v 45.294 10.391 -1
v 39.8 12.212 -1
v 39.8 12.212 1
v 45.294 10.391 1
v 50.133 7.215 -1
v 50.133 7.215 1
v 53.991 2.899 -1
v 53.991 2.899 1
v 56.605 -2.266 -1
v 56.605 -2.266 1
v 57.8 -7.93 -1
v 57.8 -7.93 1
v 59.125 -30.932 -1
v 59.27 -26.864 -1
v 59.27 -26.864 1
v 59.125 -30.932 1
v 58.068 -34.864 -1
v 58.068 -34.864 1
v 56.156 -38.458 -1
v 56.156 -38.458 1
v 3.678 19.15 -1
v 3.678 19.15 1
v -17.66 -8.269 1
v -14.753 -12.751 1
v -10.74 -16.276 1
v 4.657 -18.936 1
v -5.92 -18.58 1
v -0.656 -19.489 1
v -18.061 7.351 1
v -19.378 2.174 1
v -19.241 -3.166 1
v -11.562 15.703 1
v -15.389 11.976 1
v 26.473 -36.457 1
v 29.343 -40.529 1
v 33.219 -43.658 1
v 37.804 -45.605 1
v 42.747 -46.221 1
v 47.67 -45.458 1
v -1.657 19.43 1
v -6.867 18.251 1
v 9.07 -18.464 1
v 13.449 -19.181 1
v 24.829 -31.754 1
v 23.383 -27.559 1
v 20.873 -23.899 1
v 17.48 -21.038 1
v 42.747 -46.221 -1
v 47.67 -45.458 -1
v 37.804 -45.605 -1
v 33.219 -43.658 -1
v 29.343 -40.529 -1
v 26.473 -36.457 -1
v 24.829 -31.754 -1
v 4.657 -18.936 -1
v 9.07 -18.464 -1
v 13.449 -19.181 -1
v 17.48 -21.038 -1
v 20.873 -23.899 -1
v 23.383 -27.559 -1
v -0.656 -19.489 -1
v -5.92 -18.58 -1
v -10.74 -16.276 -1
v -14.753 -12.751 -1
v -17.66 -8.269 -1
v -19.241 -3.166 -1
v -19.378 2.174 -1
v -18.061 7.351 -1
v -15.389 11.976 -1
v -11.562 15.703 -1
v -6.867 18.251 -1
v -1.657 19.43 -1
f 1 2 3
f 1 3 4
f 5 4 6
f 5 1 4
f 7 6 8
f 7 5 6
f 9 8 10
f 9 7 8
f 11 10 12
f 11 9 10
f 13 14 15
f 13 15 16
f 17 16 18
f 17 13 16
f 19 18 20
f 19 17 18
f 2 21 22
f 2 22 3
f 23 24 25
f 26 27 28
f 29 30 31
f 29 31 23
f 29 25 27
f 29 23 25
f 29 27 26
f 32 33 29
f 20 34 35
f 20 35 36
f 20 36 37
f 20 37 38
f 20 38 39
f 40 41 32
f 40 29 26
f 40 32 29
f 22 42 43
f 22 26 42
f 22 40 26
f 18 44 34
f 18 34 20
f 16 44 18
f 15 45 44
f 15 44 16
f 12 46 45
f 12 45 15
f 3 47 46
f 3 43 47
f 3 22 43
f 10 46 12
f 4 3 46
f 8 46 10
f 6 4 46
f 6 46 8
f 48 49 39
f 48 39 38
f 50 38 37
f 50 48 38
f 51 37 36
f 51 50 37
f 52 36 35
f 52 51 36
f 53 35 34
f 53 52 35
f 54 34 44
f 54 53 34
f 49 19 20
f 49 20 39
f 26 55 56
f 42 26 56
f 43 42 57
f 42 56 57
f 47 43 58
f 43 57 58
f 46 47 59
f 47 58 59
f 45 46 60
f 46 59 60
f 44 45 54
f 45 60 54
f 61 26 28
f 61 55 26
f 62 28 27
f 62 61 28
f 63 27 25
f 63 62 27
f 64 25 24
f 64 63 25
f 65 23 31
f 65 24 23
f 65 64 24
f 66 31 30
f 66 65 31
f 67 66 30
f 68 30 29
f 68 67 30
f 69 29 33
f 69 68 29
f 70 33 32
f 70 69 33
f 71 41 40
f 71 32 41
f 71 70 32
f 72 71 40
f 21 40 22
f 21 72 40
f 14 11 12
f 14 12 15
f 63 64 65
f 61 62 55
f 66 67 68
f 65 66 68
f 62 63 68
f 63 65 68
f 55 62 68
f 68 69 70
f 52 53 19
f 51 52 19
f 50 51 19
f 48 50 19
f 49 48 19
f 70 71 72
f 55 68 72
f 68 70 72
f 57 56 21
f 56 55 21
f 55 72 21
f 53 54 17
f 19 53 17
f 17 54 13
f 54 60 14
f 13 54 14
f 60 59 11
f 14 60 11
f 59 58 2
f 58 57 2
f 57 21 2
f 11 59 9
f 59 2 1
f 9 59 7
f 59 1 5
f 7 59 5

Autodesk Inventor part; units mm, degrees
sketch "Esboço1" plane through (0, 0, 0) normal (0, 0, 1) x (1, 0, 0)
  arc A0 (3.678, 19.15) -> (4.657, -18.9358) centre (0, 0) ccw
  line L0 (3.678, 19.15) -> (39.7998, 12.2124)
  line L1 (57.7995, -7.9297) -> (59.2705, -26.8636)
  arc A1 (56.1556, -38.4578) -> (59.2705, -26.8636) centre (41.3246, -28.2578) ccw
  arc A2 (24.8291, -31.7542) -> (47.6703, -45.4578) centre (42.4793, -28.2226) ccw
  arc A3 (57.7995, -7.9297) -> (39.7998, 12.2124) centre (35.6, -9.6544) ccw
  line L2 (56.1556, -38.4578) -> (47.6703, -45.4578)
  arc A4 (24.8291, -31.7542) -> (4.657, -18.9358) centre (8.6077, -35) ccw
  point P0 (17.4802, -21.0376)
  point P1 (51.913, -41.9578)
  point P2 (33.2189, -43.6578)
  point P3 (58.7081, -32.928)
  point P4 (58.535, -17.3966)
  dimension "d6" = 19.5
  dimension "d30" = 8.6077
  dimension "d34" = 35
  dimension "d35" = 51
  dimension "d36" = 13.7
  dimension "d37" = 17.2
  dimension "d38" = 15.4
  dimension "d39" = 18
  dimension "d40" = 11
  dimension "d41" = 18
  dimension "d42" = 22.935
  dimension "d43" = 35.6
  dimension "d44" = 19.15
extrude "Extrusão1" add sketch "Esboço1" along normal mid plane 2
